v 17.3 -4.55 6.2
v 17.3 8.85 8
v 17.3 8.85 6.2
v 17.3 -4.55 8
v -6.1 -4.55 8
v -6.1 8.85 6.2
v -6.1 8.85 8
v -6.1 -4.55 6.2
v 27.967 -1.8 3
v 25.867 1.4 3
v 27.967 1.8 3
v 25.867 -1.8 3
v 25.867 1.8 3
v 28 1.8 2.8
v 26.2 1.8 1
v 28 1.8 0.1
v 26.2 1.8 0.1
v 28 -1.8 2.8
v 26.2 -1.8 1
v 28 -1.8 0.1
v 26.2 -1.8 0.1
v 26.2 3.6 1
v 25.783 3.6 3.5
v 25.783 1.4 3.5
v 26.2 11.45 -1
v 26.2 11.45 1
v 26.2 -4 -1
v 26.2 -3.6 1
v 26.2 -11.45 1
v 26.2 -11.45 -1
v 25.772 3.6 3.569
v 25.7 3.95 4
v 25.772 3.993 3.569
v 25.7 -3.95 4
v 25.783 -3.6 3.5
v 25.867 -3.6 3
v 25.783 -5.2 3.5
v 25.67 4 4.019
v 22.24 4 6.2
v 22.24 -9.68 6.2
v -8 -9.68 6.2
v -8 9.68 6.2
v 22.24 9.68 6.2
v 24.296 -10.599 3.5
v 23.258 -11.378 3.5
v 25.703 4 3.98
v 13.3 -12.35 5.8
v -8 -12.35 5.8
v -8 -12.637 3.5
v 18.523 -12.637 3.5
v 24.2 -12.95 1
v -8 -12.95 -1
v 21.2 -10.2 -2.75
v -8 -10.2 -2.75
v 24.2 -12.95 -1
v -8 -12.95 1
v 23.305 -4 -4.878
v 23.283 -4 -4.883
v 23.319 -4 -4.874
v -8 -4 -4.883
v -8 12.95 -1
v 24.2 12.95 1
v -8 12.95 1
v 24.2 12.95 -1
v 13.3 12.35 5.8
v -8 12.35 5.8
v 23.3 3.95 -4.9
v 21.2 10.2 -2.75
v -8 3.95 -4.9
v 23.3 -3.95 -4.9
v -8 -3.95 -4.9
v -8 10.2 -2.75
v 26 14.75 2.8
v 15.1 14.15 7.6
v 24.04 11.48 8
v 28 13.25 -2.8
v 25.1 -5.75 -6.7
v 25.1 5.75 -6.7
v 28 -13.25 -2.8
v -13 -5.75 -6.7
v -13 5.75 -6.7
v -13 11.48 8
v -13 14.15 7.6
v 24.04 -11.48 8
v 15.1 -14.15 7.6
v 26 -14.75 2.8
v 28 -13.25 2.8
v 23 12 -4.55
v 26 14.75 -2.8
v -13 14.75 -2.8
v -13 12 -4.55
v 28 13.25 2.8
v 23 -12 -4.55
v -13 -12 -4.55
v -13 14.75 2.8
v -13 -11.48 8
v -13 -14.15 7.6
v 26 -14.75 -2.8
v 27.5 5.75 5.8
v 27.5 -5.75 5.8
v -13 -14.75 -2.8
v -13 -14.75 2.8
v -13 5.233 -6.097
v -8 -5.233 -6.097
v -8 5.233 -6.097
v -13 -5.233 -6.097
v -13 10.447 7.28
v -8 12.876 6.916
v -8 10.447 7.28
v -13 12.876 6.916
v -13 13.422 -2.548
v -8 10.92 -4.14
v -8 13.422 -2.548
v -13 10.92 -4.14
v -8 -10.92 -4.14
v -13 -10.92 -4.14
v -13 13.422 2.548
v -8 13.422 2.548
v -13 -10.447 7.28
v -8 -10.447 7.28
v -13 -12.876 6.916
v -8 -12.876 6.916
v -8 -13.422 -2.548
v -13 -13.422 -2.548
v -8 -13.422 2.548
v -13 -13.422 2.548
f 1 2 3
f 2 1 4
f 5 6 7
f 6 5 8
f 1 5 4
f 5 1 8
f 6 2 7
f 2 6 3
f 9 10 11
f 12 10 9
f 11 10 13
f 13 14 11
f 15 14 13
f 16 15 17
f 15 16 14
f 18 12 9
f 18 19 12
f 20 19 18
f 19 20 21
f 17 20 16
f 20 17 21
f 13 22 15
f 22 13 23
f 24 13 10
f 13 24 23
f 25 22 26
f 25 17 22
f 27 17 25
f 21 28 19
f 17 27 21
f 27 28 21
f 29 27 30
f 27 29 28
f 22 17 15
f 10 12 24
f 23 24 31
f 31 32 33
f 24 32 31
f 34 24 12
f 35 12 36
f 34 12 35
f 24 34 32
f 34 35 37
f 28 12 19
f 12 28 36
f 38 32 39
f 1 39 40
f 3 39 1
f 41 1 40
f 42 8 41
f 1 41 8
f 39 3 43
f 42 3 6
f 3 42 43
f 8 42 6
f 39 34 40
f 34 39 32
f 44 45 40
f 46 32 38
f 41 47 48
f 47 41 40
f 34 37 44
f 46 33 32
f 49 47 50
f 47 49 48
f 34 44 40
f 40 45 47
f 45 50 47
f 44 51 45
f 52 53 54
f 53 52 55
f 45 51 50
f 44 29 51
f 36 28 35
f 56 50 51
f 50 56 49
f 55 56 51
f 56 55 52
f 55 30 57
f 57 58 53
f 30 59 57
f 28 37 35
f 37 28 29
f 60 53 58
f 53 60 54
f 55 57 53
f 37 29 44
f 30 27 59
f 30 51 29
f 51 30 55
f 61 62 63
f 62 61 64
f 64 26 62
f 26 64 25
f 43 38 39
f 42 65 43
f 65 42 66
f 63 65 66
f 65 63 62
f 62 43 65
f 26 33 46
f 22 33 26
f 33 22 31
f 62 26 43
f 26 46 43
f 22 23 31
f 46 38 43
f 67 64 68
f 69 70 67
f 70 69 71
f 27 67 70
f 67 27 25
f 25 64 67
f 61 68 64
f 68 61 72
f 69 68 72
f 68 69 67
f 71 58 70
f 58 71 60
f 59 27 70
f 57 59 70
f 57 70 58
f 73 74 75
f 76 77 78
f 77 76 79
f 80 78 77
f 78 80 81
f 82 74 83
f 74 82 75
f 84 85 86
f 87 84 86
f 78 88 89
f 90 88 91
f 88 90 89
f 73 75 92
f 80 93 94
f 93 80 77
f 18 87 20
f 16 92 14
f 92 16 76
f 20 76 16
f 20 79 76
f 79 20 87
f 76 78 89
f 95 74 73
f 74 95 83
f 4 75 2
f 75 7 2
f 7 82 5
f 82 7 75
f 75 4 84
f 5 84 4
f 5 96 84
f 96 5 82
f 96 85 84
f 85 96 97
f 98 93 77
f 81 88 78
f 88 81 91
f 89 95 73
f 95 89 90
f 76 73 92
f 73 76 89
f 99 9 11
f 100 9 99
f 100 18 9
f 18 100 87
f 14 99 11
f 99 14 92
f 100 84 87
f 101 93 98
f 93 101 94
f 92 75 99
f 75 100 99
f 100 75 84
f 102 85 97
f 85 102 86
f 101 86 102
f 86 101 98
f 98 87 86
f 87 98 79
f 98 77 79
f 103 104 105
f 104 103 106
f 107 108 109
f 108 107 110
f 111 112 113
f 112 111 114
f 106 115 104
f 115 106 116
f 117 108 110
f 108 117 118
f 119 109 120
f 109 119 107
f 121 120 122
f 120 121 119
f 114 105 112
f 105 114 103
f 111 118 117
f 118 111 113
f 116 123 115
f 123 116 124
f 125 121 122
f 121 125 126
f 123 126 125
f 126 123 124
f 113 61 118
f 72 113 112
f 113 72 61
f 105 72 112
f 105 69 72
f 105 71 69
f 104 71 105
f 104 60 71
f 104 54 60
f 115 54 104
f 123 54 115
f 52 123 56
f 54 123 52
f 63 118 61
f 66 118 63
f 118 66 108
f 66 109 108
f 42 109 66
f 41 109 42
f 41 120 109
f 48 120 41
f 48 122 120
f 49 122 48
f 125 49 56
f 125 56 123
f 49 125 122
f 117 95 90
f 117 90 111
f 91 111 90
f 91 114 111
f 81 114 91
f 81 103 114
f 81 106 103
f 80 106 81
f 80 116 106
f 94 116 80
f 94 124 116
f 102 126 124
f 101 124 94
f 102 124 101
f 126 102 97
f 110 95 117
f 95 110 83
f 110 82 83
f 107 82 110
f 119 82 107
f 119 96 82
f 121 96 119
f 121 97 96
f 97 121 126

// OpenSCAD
// file: device_model.scad
pcb_thickness = 1.6;

module device() {
    $fn = 20;

    pcb1();
    pcb2();
    pcb3();
    microusb();
    reset_button();
    program_button();
    oled();
    oled_ribbon();
    wifi_pigtail();
    ipex_connector();
    battery_jack();
    misc();
}

module pcb1() {
    translate([-26, -12.75, 0]) {
        linear_extrude(height = pcb_thickness, center = true, convexity = 10) {
            polygon(points=[[2,0],[48,0],[48,25.5],[2,25.5]]);
        }
    }
}

module pcb2() {
    translate([-26, -12.75, 0]) {
        linear_extrude(height = pcb_thickness, center = true, convexity = 10) {
            polygon(points=[[0,1.5],[2,0],[2,25.5],[0,23.5]]);
        }
    }
}

module pcb3() {
    translate([-26, -12.75, 0]) {
        linear_extrude(height = pcb_thickness, center = true, convexity = 10) {
            polygon(points=[[48,3.7],[52,7.7],[52,17.8],[48,21.8]]);
        }
    }
}

module microusb() {
    translate([-52/2 + 5.5/2 + .5, 0, 3/2 + pcb_thickness/2]) {
        cube([5.5,7.5,3], center = true);
    }
}

module reset_button() {
    translate([-52/2 + 4/2 + 1.75, -25.5/2 + 3.2/2 + 3, 2/2 + pcb_thickness/2]) {
        cube([4,3.2,2], center = true);
    }
}

module program_button() {
    translate([-52/2 + 4/2 + 1.75, 25.5/2 - 3.2/2 - 3, 2/2 + pcb_thickness/2]) {
        cube([4,3.2,2], center = true);
    }
}

module oled() {
    translate([5.4, 0.2, 5.2/2 + pcb_thickness/2]) {
        cube([33.28,18.56,5.2], center = true);
    }
}

module oled_ribbon() {
    translate([5.6, -10.4, 4.8/2 + pcb_thickness/2]) {
        cube([15,3.5,4.8], center = true);
    }
}

module wifi_pigtail() {
    translate([-52/2 + 5/2 + 9, 25.5/2 - 5/2 - 4.4, 5/2 + pcb_thickness/2]) {
        cylinder(h=5, r=2.5, center = true);
    }
}

module ipex_connector() {
    translate([23.8, 0, 1.5/2 + pcb_thickness/2]) {
        cube([2.2,2.2,1.5], center = true);
    }
}

module battery_jack() {
    translate([-52/2 + 5.25/2 + 2.9, 0, -3.9/2 - pcb_thickness/2]) {
        cube([5.25,7.5,3.9], center = true);
    }
}

module misc() {
    cube([42, 20, pcb_thickness + 3.5], center=true);
}
// file: shell.scad
include <device_model.scad>

module shell() {
    $fn = 10;
	difference() {
		minkowski() {
			mirrored_hull();
			cube(4, center = true);
		}
        minkowski() {
            union() {
                mirrored_hull();
                ports();
            }
            cube(0.4, center = true);
        }
	}
}

module cutout() {

}

module mirrored_hull() {
    hull() {
        device();
        scale([1,-1,1]) {
            device();
        }
        scale([-1,-1,1]) {
            device();
        }
        scale([-1,1,1]) {
            device();
        }
    }
}

module ports() {
    // Micro-USB plug
    translate([-26 - 20/2 + 10, 0, 2.5/2 + pcb_thickness/2]) {
        cube([20, 7.6, 2.5], center = true);
    }
    
    // Micro-USB plug body cutout
    translate([-26 - 20/2 - 0.9, 0, 2.5/2 + pcb_thickness/2]) {
        cube([20, 11.4, 7.6], center = true);
    }

    // OLED cutout (illuminated portion)
    translate([5.6, 1.55+0.6, 5/2 + pcb_thickness/2 + 2]) {
        cube([23,13,10], center = true);
    }
    
    // IPEX Connector (extended for cutout)
    translate([24.2, 0, 1.5/2 + pcb_thickness/2]) {
        cube([20,3.2,2.5], center = true);
    }
}
// main file
include <shell.scad>

difference() {
    shell();
    translate([-38, 0, 0]) {
        cube([50, 50, 50], center = true);
    }
    difference() {
        scale(.91, center = true) {
            shell();
        }
        translate([17, 0, 0]) {
            cube([50, 50, 50], center = true);
        }
    }
}
